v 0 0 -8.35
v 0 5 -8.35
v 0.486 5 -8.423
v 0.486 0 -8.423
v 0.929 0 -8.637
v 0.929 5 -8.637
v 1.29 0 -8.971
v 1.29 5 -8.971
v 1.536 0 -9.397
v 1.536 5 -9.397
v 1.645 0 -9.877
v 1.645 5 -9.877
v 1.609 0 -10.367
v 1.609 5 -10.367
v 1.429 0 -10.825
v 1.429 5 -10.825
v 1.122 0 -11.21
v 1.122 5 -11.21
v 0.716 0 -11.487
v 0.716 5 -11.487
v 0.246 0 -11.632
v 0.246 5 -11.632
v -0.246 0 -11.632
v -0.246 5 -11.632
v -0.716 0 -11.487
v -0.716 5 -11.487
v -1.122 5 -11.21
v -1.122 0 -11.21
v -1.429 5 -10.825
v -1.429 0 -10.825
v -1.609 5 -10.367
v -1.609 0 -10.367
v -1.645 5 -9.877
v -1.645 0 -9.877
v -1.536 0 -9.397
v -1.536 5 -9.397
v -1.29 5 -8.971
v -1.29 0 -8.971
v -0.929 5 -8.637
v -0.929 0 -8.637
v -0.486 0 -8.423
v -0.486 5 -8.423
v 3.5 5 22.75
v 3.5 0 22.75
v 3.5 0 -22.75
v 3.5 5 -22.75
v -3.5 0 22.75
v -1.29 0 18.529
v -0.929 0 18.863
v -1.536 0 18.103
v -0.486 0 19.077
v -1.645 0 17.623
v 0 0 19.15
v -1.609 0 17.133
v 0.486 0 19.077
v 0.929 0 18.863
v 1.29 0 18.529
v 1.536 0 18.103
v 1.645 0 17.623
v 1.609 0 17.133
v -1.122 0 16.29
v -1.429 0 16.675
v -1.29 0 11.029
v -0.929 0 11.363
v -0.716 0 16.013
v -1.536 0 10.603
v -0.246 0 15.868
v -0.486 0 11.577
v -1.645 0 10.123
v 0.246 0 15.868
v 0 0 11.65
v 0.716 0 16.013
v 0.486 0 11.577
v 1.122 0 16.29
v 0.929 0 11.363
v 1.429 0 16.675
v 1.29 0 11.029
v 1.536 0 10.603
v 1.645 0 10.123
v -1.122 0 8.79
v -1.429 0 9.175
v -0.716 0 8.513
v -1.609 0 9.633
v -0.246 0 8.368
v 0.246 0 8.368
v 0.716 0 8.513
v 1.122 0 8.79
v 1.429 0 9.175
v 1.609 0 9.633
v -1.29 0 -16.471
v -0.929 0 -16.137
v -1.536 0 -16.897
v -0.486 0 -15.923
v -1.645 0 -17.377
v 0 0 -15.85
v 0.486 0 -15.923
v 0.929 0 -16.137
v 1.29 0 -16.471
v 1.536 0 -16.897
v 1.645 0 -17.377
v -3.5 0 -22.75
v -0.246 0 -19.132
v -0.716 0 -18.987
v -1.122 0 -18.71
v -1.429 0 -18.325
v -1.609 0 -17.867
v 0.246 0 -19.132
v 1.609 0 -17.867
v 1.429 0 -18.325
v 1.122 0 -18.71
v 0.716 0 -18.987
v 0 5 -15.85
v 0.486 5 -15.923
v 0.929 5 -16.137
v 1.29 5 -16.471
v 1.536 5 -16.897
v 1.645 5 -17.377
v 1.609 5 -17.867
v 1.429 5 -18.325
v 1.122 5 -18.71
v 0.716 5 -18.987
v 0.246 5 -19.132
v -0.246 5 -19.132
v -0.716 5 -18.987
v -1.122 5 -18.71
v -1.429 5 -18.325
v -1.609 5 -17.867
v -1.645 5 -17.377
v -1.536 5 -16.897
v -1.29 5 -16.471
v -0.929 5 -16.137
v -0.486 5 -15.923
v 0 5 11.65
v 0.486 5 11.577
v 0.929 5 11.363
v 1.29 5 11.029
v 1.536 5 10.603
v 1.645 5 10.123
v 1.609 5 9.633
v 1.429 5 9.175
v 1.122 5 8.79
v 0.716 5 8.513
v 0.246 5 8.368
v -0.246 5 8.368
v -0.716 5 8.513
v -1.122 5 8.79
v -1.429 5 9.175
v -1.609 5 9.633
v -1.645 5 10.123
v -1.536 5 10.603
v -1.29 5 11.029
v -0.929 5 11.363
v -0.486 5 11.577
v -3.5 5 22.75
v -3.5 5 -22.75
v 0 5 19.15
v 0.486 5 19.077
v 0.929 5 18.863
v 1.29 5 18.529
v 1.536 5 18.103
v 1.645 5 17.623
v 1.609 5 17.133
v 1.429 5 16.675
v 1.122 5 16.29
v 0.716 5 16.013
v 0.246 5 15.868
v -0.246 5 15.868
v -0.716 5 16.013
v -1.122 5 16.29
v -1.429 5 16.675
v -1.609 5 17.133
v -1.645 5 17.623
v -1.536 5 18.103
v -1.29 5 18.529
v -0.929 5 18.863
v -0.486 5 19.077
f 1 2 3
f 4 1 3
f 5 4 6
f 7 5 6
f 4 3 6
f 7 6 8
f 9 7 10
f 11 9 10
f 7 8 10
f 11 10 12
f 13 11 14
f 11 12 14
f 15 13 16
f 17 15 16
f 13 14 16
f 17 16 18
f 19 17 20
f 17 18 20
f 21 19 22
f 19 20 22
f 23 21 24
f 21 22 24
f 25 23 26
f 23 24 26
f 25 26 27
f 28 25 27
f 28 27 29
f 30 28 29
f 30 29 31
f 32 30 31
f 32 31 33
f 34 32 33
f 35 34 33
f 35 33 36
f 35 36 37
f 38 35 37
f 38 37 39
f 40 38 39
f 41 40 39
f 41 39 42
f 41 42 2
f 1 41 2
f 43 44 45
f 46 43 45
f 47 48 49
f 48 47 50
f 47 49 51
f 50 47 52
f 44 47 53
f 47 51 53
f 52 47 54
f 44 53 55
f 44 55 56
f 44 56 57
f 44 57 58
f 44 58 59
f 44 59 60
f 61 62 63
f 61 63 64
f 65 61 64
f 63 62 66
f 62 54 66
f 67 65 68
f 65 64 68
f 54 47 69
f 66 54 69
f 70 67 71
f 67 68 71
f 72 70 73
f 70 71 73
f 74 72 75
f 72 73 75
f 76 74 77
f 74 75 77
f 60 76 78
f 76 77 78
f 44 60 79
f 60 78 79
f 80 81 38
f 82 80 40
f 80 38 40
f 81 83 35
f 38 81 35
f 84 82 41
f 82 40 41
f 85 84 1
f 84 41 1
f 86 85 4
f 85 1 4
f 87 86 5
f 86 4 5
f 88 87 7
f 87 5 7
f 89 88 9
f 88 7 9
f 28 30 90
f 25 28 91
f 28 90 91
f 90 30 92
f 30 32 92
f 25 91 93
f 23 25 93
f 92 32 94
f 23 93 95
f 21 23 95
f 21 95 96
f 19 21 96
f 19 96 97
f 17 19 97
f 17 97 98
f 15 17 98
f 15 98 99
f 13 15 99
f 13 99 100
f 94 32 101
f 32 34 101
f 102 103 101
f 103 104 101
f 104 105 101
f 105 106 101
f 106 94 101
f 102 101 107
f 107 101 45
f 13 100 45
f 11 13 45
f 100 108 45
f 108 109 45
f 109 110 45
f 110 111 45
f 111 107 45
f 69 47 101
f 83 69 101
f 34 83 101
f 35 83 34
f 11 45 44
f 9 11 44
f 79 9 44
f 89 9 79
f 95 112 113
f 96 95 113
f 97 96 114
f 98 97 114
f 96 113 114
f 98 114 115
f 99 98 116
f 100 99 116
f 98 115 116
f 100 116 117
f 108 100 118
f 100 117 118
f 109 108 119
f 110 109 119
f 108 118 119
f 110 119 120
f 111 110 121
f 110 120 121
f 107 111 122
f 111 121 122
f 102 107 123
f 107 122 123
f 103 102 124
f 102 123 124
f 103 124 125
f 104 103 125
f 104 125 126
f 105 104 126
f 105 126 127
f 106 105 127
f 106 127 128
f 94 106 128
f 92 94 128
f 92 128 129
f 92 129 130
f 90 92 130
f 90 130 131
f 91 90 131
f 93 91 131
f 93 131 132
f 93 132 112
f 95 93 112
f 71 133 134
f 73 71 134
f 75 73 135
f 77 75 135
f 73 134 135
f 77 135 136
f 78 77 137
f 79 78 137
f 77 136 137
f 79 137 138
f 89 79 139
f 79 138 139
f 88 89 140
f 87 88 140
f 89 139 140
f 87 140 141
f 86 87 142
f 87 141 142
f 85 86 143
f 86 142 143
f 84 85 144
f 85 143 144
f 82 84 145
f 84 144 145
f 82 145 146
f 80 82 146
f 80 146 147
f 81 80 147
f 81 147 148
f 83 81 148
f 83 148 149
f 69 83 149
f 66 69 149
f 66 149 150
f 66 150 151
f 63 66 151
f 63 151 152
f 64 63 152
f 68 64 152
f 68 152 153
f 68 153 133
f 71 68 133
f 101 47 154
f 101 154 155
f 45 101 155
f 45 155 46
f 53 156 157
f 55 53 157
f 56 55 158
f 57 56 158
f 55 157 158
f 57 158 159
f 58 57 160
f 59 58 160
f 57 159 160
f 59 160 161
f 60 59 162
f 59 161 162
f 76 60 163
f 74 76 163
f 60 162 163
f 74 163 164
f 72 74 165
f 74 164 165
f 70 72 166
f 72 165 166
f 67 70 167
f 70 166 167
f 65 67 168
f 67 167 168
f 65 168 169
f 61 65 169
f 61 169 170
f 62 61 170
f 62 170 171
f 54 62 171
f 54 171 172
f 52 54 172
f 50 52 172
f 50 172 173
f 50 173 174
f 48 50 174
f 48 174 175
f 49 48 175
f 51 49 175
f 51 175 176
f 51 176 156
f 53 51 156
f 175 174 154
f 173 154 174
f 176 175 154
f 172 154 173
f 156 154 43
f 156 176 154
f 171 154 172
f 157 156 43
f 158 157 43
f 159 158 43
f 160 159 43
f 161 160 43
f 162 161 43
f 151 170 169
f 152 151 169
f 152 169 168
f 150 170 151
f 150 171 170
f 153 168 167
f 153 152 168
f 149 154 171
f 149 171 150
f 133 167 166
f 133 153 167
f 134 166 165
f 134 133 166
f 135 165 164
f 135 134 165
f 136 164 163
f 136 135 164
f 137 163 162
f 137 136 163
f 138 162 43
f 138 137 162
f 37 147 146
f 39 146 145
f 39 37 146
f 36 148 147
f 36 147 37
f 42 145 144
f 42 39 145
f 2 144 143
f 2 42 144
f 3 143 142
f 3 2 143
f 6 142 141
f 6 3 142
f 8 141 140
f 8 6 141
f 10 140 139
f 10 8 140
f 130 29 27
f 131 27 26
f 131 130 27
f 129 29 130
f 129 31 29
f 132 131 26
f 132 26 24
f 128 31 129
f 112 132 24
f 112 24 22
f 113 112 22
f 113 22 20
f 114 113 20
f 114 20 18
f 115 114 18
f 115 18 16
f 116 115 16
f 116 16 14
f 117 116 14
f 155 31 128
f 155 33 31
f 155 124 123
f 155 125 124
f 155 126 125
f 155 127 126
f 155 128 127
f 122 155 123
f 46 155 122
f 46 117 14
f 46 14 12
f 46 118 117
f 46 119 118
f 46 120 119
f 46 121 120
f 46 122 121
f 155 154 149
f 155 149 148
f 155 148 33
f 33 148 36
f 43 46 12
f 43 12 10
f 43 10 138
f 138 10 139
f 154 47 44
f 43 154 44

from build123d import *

# Parameters (mm, degrees)
SKETCH_1_W          = 7
SKETCH_1_H          = 45.5
EXTRUDE_1_DEPTH     = 5
CUT_EXTRUDE_1_REACH = 25.554
SKETCH_2_R          = 1.65
CUT_EXTRUDE_2_REACH = 25.554
SKETCH_3_R          = 1.65


with BuildPart() as part:
    # 草图1 → 凸台-拉伸1 (new body)
    with BuildSketch(Plane(origin=(0, 0, 0), x_dir=(1, 0, 0), z_dir=(0, 1, 0))):
        Rectangle(SKETCH_1_W, SKETCH_1_H)
    extrude(amount=EXTRUDE_1_DEPTH)

    # 草图2 → 切除-拉伸1 (cut, up to next)
    with BuildSketch(Plane(origin=(0, 5, 0), x_dir=(1, 0, 0), z_dir=(0, 1, 0)), mode=Mode.PRIVATE) as cut_extrude_1_sk1:
        with Locations(Location((0, 17.5, 0), (0, 0, 270))):
            Circle(SKETCH_2_R)
    cut_extrude_1_tool1 = extrude(cut_extrude_1_sk1.sketch, amount=-CUT_EXTRUDE_1_REACH, mode=Mode.PRIVATE) & part.part
    # 草图2 → 切除-拉伸1 (cut, up to next)
    with BuildSketch(Plane(origin=(0, 5, 0), x_dir=(1, 0, 0), z_dir=(0, 1, 0)), mode=Mode.PRIVATE) as cut_extrude_1_sk2:
        with Locations(Location((0, -17.5, 0), (0, 0, 270))):
            Circle(SKETCH_2_R)
    cut_extrude_1_tool2 = extrude(cut_extrude_1_sk2.sketch, amount=-CUT_EXTRUDE_1_REACH, mode=Mode.PRIVATE) & part.part
    add(cut_extrude_1_tool1.solids().sort_by_distance((0, 5, -17.5))[0], mode=Mode.SUBTRACT)
    add(cut_extrude_1_tool2.solids().sort_by_distance((0, 5, 17.5))[0], mode=Mode.SUBTRACT)

    # 草图3 → 切除-拉伸2 (cut, up to next)
    with BuildSketch(Plane(origin=(0, 5, 0), x_dir=(1, 0, 0), z_dir=(0, 1, 0)), mode=Mode.PRIVATE) as cut_extrude_2_sk1:
        with Locations(Location((0, 10, 0), (0, 0, 270))):
            Circle(SKETCH_3_R)
    cut_extrude_2_tool1 = extrude(cut_extrude_2_sk1.sketch, amount=-CUT_EXTRUDE_2_REACH, mode=Mode.PRIVATE) & part.part
    # 草图3 → 切除-拉伸2 (cut, up to next)
    with BuildSketch(Plane(origin=(0, 5, 0), x_dir=(1, 0, 0), z_dir=(0, 1, 0)), mode=Mode.PRIVATE) as cut_extrude_2_sk2:
        with Locations(Location((0, -10, 0), (0, 0, 270))):
            Circle(SKETCH_3_R)
    cut_extrude_2_tool2 = extrude(cut_extrude_2_sk2.sketch, amount=-CUT_EXTRUDE_2_REACH, mode=Mode.PRIVATE) & part.part
    add(cut_extrude_2_tool1.solids().sort_by_distance((0, 5, -10))[0], mode=Mode.SUBTRACT)
    add(cut_extrude_2_tool2.solids().sort_by_distance((0, 5, 10))[0], mode=Mode.SUBTRACT)


solid = part.part
